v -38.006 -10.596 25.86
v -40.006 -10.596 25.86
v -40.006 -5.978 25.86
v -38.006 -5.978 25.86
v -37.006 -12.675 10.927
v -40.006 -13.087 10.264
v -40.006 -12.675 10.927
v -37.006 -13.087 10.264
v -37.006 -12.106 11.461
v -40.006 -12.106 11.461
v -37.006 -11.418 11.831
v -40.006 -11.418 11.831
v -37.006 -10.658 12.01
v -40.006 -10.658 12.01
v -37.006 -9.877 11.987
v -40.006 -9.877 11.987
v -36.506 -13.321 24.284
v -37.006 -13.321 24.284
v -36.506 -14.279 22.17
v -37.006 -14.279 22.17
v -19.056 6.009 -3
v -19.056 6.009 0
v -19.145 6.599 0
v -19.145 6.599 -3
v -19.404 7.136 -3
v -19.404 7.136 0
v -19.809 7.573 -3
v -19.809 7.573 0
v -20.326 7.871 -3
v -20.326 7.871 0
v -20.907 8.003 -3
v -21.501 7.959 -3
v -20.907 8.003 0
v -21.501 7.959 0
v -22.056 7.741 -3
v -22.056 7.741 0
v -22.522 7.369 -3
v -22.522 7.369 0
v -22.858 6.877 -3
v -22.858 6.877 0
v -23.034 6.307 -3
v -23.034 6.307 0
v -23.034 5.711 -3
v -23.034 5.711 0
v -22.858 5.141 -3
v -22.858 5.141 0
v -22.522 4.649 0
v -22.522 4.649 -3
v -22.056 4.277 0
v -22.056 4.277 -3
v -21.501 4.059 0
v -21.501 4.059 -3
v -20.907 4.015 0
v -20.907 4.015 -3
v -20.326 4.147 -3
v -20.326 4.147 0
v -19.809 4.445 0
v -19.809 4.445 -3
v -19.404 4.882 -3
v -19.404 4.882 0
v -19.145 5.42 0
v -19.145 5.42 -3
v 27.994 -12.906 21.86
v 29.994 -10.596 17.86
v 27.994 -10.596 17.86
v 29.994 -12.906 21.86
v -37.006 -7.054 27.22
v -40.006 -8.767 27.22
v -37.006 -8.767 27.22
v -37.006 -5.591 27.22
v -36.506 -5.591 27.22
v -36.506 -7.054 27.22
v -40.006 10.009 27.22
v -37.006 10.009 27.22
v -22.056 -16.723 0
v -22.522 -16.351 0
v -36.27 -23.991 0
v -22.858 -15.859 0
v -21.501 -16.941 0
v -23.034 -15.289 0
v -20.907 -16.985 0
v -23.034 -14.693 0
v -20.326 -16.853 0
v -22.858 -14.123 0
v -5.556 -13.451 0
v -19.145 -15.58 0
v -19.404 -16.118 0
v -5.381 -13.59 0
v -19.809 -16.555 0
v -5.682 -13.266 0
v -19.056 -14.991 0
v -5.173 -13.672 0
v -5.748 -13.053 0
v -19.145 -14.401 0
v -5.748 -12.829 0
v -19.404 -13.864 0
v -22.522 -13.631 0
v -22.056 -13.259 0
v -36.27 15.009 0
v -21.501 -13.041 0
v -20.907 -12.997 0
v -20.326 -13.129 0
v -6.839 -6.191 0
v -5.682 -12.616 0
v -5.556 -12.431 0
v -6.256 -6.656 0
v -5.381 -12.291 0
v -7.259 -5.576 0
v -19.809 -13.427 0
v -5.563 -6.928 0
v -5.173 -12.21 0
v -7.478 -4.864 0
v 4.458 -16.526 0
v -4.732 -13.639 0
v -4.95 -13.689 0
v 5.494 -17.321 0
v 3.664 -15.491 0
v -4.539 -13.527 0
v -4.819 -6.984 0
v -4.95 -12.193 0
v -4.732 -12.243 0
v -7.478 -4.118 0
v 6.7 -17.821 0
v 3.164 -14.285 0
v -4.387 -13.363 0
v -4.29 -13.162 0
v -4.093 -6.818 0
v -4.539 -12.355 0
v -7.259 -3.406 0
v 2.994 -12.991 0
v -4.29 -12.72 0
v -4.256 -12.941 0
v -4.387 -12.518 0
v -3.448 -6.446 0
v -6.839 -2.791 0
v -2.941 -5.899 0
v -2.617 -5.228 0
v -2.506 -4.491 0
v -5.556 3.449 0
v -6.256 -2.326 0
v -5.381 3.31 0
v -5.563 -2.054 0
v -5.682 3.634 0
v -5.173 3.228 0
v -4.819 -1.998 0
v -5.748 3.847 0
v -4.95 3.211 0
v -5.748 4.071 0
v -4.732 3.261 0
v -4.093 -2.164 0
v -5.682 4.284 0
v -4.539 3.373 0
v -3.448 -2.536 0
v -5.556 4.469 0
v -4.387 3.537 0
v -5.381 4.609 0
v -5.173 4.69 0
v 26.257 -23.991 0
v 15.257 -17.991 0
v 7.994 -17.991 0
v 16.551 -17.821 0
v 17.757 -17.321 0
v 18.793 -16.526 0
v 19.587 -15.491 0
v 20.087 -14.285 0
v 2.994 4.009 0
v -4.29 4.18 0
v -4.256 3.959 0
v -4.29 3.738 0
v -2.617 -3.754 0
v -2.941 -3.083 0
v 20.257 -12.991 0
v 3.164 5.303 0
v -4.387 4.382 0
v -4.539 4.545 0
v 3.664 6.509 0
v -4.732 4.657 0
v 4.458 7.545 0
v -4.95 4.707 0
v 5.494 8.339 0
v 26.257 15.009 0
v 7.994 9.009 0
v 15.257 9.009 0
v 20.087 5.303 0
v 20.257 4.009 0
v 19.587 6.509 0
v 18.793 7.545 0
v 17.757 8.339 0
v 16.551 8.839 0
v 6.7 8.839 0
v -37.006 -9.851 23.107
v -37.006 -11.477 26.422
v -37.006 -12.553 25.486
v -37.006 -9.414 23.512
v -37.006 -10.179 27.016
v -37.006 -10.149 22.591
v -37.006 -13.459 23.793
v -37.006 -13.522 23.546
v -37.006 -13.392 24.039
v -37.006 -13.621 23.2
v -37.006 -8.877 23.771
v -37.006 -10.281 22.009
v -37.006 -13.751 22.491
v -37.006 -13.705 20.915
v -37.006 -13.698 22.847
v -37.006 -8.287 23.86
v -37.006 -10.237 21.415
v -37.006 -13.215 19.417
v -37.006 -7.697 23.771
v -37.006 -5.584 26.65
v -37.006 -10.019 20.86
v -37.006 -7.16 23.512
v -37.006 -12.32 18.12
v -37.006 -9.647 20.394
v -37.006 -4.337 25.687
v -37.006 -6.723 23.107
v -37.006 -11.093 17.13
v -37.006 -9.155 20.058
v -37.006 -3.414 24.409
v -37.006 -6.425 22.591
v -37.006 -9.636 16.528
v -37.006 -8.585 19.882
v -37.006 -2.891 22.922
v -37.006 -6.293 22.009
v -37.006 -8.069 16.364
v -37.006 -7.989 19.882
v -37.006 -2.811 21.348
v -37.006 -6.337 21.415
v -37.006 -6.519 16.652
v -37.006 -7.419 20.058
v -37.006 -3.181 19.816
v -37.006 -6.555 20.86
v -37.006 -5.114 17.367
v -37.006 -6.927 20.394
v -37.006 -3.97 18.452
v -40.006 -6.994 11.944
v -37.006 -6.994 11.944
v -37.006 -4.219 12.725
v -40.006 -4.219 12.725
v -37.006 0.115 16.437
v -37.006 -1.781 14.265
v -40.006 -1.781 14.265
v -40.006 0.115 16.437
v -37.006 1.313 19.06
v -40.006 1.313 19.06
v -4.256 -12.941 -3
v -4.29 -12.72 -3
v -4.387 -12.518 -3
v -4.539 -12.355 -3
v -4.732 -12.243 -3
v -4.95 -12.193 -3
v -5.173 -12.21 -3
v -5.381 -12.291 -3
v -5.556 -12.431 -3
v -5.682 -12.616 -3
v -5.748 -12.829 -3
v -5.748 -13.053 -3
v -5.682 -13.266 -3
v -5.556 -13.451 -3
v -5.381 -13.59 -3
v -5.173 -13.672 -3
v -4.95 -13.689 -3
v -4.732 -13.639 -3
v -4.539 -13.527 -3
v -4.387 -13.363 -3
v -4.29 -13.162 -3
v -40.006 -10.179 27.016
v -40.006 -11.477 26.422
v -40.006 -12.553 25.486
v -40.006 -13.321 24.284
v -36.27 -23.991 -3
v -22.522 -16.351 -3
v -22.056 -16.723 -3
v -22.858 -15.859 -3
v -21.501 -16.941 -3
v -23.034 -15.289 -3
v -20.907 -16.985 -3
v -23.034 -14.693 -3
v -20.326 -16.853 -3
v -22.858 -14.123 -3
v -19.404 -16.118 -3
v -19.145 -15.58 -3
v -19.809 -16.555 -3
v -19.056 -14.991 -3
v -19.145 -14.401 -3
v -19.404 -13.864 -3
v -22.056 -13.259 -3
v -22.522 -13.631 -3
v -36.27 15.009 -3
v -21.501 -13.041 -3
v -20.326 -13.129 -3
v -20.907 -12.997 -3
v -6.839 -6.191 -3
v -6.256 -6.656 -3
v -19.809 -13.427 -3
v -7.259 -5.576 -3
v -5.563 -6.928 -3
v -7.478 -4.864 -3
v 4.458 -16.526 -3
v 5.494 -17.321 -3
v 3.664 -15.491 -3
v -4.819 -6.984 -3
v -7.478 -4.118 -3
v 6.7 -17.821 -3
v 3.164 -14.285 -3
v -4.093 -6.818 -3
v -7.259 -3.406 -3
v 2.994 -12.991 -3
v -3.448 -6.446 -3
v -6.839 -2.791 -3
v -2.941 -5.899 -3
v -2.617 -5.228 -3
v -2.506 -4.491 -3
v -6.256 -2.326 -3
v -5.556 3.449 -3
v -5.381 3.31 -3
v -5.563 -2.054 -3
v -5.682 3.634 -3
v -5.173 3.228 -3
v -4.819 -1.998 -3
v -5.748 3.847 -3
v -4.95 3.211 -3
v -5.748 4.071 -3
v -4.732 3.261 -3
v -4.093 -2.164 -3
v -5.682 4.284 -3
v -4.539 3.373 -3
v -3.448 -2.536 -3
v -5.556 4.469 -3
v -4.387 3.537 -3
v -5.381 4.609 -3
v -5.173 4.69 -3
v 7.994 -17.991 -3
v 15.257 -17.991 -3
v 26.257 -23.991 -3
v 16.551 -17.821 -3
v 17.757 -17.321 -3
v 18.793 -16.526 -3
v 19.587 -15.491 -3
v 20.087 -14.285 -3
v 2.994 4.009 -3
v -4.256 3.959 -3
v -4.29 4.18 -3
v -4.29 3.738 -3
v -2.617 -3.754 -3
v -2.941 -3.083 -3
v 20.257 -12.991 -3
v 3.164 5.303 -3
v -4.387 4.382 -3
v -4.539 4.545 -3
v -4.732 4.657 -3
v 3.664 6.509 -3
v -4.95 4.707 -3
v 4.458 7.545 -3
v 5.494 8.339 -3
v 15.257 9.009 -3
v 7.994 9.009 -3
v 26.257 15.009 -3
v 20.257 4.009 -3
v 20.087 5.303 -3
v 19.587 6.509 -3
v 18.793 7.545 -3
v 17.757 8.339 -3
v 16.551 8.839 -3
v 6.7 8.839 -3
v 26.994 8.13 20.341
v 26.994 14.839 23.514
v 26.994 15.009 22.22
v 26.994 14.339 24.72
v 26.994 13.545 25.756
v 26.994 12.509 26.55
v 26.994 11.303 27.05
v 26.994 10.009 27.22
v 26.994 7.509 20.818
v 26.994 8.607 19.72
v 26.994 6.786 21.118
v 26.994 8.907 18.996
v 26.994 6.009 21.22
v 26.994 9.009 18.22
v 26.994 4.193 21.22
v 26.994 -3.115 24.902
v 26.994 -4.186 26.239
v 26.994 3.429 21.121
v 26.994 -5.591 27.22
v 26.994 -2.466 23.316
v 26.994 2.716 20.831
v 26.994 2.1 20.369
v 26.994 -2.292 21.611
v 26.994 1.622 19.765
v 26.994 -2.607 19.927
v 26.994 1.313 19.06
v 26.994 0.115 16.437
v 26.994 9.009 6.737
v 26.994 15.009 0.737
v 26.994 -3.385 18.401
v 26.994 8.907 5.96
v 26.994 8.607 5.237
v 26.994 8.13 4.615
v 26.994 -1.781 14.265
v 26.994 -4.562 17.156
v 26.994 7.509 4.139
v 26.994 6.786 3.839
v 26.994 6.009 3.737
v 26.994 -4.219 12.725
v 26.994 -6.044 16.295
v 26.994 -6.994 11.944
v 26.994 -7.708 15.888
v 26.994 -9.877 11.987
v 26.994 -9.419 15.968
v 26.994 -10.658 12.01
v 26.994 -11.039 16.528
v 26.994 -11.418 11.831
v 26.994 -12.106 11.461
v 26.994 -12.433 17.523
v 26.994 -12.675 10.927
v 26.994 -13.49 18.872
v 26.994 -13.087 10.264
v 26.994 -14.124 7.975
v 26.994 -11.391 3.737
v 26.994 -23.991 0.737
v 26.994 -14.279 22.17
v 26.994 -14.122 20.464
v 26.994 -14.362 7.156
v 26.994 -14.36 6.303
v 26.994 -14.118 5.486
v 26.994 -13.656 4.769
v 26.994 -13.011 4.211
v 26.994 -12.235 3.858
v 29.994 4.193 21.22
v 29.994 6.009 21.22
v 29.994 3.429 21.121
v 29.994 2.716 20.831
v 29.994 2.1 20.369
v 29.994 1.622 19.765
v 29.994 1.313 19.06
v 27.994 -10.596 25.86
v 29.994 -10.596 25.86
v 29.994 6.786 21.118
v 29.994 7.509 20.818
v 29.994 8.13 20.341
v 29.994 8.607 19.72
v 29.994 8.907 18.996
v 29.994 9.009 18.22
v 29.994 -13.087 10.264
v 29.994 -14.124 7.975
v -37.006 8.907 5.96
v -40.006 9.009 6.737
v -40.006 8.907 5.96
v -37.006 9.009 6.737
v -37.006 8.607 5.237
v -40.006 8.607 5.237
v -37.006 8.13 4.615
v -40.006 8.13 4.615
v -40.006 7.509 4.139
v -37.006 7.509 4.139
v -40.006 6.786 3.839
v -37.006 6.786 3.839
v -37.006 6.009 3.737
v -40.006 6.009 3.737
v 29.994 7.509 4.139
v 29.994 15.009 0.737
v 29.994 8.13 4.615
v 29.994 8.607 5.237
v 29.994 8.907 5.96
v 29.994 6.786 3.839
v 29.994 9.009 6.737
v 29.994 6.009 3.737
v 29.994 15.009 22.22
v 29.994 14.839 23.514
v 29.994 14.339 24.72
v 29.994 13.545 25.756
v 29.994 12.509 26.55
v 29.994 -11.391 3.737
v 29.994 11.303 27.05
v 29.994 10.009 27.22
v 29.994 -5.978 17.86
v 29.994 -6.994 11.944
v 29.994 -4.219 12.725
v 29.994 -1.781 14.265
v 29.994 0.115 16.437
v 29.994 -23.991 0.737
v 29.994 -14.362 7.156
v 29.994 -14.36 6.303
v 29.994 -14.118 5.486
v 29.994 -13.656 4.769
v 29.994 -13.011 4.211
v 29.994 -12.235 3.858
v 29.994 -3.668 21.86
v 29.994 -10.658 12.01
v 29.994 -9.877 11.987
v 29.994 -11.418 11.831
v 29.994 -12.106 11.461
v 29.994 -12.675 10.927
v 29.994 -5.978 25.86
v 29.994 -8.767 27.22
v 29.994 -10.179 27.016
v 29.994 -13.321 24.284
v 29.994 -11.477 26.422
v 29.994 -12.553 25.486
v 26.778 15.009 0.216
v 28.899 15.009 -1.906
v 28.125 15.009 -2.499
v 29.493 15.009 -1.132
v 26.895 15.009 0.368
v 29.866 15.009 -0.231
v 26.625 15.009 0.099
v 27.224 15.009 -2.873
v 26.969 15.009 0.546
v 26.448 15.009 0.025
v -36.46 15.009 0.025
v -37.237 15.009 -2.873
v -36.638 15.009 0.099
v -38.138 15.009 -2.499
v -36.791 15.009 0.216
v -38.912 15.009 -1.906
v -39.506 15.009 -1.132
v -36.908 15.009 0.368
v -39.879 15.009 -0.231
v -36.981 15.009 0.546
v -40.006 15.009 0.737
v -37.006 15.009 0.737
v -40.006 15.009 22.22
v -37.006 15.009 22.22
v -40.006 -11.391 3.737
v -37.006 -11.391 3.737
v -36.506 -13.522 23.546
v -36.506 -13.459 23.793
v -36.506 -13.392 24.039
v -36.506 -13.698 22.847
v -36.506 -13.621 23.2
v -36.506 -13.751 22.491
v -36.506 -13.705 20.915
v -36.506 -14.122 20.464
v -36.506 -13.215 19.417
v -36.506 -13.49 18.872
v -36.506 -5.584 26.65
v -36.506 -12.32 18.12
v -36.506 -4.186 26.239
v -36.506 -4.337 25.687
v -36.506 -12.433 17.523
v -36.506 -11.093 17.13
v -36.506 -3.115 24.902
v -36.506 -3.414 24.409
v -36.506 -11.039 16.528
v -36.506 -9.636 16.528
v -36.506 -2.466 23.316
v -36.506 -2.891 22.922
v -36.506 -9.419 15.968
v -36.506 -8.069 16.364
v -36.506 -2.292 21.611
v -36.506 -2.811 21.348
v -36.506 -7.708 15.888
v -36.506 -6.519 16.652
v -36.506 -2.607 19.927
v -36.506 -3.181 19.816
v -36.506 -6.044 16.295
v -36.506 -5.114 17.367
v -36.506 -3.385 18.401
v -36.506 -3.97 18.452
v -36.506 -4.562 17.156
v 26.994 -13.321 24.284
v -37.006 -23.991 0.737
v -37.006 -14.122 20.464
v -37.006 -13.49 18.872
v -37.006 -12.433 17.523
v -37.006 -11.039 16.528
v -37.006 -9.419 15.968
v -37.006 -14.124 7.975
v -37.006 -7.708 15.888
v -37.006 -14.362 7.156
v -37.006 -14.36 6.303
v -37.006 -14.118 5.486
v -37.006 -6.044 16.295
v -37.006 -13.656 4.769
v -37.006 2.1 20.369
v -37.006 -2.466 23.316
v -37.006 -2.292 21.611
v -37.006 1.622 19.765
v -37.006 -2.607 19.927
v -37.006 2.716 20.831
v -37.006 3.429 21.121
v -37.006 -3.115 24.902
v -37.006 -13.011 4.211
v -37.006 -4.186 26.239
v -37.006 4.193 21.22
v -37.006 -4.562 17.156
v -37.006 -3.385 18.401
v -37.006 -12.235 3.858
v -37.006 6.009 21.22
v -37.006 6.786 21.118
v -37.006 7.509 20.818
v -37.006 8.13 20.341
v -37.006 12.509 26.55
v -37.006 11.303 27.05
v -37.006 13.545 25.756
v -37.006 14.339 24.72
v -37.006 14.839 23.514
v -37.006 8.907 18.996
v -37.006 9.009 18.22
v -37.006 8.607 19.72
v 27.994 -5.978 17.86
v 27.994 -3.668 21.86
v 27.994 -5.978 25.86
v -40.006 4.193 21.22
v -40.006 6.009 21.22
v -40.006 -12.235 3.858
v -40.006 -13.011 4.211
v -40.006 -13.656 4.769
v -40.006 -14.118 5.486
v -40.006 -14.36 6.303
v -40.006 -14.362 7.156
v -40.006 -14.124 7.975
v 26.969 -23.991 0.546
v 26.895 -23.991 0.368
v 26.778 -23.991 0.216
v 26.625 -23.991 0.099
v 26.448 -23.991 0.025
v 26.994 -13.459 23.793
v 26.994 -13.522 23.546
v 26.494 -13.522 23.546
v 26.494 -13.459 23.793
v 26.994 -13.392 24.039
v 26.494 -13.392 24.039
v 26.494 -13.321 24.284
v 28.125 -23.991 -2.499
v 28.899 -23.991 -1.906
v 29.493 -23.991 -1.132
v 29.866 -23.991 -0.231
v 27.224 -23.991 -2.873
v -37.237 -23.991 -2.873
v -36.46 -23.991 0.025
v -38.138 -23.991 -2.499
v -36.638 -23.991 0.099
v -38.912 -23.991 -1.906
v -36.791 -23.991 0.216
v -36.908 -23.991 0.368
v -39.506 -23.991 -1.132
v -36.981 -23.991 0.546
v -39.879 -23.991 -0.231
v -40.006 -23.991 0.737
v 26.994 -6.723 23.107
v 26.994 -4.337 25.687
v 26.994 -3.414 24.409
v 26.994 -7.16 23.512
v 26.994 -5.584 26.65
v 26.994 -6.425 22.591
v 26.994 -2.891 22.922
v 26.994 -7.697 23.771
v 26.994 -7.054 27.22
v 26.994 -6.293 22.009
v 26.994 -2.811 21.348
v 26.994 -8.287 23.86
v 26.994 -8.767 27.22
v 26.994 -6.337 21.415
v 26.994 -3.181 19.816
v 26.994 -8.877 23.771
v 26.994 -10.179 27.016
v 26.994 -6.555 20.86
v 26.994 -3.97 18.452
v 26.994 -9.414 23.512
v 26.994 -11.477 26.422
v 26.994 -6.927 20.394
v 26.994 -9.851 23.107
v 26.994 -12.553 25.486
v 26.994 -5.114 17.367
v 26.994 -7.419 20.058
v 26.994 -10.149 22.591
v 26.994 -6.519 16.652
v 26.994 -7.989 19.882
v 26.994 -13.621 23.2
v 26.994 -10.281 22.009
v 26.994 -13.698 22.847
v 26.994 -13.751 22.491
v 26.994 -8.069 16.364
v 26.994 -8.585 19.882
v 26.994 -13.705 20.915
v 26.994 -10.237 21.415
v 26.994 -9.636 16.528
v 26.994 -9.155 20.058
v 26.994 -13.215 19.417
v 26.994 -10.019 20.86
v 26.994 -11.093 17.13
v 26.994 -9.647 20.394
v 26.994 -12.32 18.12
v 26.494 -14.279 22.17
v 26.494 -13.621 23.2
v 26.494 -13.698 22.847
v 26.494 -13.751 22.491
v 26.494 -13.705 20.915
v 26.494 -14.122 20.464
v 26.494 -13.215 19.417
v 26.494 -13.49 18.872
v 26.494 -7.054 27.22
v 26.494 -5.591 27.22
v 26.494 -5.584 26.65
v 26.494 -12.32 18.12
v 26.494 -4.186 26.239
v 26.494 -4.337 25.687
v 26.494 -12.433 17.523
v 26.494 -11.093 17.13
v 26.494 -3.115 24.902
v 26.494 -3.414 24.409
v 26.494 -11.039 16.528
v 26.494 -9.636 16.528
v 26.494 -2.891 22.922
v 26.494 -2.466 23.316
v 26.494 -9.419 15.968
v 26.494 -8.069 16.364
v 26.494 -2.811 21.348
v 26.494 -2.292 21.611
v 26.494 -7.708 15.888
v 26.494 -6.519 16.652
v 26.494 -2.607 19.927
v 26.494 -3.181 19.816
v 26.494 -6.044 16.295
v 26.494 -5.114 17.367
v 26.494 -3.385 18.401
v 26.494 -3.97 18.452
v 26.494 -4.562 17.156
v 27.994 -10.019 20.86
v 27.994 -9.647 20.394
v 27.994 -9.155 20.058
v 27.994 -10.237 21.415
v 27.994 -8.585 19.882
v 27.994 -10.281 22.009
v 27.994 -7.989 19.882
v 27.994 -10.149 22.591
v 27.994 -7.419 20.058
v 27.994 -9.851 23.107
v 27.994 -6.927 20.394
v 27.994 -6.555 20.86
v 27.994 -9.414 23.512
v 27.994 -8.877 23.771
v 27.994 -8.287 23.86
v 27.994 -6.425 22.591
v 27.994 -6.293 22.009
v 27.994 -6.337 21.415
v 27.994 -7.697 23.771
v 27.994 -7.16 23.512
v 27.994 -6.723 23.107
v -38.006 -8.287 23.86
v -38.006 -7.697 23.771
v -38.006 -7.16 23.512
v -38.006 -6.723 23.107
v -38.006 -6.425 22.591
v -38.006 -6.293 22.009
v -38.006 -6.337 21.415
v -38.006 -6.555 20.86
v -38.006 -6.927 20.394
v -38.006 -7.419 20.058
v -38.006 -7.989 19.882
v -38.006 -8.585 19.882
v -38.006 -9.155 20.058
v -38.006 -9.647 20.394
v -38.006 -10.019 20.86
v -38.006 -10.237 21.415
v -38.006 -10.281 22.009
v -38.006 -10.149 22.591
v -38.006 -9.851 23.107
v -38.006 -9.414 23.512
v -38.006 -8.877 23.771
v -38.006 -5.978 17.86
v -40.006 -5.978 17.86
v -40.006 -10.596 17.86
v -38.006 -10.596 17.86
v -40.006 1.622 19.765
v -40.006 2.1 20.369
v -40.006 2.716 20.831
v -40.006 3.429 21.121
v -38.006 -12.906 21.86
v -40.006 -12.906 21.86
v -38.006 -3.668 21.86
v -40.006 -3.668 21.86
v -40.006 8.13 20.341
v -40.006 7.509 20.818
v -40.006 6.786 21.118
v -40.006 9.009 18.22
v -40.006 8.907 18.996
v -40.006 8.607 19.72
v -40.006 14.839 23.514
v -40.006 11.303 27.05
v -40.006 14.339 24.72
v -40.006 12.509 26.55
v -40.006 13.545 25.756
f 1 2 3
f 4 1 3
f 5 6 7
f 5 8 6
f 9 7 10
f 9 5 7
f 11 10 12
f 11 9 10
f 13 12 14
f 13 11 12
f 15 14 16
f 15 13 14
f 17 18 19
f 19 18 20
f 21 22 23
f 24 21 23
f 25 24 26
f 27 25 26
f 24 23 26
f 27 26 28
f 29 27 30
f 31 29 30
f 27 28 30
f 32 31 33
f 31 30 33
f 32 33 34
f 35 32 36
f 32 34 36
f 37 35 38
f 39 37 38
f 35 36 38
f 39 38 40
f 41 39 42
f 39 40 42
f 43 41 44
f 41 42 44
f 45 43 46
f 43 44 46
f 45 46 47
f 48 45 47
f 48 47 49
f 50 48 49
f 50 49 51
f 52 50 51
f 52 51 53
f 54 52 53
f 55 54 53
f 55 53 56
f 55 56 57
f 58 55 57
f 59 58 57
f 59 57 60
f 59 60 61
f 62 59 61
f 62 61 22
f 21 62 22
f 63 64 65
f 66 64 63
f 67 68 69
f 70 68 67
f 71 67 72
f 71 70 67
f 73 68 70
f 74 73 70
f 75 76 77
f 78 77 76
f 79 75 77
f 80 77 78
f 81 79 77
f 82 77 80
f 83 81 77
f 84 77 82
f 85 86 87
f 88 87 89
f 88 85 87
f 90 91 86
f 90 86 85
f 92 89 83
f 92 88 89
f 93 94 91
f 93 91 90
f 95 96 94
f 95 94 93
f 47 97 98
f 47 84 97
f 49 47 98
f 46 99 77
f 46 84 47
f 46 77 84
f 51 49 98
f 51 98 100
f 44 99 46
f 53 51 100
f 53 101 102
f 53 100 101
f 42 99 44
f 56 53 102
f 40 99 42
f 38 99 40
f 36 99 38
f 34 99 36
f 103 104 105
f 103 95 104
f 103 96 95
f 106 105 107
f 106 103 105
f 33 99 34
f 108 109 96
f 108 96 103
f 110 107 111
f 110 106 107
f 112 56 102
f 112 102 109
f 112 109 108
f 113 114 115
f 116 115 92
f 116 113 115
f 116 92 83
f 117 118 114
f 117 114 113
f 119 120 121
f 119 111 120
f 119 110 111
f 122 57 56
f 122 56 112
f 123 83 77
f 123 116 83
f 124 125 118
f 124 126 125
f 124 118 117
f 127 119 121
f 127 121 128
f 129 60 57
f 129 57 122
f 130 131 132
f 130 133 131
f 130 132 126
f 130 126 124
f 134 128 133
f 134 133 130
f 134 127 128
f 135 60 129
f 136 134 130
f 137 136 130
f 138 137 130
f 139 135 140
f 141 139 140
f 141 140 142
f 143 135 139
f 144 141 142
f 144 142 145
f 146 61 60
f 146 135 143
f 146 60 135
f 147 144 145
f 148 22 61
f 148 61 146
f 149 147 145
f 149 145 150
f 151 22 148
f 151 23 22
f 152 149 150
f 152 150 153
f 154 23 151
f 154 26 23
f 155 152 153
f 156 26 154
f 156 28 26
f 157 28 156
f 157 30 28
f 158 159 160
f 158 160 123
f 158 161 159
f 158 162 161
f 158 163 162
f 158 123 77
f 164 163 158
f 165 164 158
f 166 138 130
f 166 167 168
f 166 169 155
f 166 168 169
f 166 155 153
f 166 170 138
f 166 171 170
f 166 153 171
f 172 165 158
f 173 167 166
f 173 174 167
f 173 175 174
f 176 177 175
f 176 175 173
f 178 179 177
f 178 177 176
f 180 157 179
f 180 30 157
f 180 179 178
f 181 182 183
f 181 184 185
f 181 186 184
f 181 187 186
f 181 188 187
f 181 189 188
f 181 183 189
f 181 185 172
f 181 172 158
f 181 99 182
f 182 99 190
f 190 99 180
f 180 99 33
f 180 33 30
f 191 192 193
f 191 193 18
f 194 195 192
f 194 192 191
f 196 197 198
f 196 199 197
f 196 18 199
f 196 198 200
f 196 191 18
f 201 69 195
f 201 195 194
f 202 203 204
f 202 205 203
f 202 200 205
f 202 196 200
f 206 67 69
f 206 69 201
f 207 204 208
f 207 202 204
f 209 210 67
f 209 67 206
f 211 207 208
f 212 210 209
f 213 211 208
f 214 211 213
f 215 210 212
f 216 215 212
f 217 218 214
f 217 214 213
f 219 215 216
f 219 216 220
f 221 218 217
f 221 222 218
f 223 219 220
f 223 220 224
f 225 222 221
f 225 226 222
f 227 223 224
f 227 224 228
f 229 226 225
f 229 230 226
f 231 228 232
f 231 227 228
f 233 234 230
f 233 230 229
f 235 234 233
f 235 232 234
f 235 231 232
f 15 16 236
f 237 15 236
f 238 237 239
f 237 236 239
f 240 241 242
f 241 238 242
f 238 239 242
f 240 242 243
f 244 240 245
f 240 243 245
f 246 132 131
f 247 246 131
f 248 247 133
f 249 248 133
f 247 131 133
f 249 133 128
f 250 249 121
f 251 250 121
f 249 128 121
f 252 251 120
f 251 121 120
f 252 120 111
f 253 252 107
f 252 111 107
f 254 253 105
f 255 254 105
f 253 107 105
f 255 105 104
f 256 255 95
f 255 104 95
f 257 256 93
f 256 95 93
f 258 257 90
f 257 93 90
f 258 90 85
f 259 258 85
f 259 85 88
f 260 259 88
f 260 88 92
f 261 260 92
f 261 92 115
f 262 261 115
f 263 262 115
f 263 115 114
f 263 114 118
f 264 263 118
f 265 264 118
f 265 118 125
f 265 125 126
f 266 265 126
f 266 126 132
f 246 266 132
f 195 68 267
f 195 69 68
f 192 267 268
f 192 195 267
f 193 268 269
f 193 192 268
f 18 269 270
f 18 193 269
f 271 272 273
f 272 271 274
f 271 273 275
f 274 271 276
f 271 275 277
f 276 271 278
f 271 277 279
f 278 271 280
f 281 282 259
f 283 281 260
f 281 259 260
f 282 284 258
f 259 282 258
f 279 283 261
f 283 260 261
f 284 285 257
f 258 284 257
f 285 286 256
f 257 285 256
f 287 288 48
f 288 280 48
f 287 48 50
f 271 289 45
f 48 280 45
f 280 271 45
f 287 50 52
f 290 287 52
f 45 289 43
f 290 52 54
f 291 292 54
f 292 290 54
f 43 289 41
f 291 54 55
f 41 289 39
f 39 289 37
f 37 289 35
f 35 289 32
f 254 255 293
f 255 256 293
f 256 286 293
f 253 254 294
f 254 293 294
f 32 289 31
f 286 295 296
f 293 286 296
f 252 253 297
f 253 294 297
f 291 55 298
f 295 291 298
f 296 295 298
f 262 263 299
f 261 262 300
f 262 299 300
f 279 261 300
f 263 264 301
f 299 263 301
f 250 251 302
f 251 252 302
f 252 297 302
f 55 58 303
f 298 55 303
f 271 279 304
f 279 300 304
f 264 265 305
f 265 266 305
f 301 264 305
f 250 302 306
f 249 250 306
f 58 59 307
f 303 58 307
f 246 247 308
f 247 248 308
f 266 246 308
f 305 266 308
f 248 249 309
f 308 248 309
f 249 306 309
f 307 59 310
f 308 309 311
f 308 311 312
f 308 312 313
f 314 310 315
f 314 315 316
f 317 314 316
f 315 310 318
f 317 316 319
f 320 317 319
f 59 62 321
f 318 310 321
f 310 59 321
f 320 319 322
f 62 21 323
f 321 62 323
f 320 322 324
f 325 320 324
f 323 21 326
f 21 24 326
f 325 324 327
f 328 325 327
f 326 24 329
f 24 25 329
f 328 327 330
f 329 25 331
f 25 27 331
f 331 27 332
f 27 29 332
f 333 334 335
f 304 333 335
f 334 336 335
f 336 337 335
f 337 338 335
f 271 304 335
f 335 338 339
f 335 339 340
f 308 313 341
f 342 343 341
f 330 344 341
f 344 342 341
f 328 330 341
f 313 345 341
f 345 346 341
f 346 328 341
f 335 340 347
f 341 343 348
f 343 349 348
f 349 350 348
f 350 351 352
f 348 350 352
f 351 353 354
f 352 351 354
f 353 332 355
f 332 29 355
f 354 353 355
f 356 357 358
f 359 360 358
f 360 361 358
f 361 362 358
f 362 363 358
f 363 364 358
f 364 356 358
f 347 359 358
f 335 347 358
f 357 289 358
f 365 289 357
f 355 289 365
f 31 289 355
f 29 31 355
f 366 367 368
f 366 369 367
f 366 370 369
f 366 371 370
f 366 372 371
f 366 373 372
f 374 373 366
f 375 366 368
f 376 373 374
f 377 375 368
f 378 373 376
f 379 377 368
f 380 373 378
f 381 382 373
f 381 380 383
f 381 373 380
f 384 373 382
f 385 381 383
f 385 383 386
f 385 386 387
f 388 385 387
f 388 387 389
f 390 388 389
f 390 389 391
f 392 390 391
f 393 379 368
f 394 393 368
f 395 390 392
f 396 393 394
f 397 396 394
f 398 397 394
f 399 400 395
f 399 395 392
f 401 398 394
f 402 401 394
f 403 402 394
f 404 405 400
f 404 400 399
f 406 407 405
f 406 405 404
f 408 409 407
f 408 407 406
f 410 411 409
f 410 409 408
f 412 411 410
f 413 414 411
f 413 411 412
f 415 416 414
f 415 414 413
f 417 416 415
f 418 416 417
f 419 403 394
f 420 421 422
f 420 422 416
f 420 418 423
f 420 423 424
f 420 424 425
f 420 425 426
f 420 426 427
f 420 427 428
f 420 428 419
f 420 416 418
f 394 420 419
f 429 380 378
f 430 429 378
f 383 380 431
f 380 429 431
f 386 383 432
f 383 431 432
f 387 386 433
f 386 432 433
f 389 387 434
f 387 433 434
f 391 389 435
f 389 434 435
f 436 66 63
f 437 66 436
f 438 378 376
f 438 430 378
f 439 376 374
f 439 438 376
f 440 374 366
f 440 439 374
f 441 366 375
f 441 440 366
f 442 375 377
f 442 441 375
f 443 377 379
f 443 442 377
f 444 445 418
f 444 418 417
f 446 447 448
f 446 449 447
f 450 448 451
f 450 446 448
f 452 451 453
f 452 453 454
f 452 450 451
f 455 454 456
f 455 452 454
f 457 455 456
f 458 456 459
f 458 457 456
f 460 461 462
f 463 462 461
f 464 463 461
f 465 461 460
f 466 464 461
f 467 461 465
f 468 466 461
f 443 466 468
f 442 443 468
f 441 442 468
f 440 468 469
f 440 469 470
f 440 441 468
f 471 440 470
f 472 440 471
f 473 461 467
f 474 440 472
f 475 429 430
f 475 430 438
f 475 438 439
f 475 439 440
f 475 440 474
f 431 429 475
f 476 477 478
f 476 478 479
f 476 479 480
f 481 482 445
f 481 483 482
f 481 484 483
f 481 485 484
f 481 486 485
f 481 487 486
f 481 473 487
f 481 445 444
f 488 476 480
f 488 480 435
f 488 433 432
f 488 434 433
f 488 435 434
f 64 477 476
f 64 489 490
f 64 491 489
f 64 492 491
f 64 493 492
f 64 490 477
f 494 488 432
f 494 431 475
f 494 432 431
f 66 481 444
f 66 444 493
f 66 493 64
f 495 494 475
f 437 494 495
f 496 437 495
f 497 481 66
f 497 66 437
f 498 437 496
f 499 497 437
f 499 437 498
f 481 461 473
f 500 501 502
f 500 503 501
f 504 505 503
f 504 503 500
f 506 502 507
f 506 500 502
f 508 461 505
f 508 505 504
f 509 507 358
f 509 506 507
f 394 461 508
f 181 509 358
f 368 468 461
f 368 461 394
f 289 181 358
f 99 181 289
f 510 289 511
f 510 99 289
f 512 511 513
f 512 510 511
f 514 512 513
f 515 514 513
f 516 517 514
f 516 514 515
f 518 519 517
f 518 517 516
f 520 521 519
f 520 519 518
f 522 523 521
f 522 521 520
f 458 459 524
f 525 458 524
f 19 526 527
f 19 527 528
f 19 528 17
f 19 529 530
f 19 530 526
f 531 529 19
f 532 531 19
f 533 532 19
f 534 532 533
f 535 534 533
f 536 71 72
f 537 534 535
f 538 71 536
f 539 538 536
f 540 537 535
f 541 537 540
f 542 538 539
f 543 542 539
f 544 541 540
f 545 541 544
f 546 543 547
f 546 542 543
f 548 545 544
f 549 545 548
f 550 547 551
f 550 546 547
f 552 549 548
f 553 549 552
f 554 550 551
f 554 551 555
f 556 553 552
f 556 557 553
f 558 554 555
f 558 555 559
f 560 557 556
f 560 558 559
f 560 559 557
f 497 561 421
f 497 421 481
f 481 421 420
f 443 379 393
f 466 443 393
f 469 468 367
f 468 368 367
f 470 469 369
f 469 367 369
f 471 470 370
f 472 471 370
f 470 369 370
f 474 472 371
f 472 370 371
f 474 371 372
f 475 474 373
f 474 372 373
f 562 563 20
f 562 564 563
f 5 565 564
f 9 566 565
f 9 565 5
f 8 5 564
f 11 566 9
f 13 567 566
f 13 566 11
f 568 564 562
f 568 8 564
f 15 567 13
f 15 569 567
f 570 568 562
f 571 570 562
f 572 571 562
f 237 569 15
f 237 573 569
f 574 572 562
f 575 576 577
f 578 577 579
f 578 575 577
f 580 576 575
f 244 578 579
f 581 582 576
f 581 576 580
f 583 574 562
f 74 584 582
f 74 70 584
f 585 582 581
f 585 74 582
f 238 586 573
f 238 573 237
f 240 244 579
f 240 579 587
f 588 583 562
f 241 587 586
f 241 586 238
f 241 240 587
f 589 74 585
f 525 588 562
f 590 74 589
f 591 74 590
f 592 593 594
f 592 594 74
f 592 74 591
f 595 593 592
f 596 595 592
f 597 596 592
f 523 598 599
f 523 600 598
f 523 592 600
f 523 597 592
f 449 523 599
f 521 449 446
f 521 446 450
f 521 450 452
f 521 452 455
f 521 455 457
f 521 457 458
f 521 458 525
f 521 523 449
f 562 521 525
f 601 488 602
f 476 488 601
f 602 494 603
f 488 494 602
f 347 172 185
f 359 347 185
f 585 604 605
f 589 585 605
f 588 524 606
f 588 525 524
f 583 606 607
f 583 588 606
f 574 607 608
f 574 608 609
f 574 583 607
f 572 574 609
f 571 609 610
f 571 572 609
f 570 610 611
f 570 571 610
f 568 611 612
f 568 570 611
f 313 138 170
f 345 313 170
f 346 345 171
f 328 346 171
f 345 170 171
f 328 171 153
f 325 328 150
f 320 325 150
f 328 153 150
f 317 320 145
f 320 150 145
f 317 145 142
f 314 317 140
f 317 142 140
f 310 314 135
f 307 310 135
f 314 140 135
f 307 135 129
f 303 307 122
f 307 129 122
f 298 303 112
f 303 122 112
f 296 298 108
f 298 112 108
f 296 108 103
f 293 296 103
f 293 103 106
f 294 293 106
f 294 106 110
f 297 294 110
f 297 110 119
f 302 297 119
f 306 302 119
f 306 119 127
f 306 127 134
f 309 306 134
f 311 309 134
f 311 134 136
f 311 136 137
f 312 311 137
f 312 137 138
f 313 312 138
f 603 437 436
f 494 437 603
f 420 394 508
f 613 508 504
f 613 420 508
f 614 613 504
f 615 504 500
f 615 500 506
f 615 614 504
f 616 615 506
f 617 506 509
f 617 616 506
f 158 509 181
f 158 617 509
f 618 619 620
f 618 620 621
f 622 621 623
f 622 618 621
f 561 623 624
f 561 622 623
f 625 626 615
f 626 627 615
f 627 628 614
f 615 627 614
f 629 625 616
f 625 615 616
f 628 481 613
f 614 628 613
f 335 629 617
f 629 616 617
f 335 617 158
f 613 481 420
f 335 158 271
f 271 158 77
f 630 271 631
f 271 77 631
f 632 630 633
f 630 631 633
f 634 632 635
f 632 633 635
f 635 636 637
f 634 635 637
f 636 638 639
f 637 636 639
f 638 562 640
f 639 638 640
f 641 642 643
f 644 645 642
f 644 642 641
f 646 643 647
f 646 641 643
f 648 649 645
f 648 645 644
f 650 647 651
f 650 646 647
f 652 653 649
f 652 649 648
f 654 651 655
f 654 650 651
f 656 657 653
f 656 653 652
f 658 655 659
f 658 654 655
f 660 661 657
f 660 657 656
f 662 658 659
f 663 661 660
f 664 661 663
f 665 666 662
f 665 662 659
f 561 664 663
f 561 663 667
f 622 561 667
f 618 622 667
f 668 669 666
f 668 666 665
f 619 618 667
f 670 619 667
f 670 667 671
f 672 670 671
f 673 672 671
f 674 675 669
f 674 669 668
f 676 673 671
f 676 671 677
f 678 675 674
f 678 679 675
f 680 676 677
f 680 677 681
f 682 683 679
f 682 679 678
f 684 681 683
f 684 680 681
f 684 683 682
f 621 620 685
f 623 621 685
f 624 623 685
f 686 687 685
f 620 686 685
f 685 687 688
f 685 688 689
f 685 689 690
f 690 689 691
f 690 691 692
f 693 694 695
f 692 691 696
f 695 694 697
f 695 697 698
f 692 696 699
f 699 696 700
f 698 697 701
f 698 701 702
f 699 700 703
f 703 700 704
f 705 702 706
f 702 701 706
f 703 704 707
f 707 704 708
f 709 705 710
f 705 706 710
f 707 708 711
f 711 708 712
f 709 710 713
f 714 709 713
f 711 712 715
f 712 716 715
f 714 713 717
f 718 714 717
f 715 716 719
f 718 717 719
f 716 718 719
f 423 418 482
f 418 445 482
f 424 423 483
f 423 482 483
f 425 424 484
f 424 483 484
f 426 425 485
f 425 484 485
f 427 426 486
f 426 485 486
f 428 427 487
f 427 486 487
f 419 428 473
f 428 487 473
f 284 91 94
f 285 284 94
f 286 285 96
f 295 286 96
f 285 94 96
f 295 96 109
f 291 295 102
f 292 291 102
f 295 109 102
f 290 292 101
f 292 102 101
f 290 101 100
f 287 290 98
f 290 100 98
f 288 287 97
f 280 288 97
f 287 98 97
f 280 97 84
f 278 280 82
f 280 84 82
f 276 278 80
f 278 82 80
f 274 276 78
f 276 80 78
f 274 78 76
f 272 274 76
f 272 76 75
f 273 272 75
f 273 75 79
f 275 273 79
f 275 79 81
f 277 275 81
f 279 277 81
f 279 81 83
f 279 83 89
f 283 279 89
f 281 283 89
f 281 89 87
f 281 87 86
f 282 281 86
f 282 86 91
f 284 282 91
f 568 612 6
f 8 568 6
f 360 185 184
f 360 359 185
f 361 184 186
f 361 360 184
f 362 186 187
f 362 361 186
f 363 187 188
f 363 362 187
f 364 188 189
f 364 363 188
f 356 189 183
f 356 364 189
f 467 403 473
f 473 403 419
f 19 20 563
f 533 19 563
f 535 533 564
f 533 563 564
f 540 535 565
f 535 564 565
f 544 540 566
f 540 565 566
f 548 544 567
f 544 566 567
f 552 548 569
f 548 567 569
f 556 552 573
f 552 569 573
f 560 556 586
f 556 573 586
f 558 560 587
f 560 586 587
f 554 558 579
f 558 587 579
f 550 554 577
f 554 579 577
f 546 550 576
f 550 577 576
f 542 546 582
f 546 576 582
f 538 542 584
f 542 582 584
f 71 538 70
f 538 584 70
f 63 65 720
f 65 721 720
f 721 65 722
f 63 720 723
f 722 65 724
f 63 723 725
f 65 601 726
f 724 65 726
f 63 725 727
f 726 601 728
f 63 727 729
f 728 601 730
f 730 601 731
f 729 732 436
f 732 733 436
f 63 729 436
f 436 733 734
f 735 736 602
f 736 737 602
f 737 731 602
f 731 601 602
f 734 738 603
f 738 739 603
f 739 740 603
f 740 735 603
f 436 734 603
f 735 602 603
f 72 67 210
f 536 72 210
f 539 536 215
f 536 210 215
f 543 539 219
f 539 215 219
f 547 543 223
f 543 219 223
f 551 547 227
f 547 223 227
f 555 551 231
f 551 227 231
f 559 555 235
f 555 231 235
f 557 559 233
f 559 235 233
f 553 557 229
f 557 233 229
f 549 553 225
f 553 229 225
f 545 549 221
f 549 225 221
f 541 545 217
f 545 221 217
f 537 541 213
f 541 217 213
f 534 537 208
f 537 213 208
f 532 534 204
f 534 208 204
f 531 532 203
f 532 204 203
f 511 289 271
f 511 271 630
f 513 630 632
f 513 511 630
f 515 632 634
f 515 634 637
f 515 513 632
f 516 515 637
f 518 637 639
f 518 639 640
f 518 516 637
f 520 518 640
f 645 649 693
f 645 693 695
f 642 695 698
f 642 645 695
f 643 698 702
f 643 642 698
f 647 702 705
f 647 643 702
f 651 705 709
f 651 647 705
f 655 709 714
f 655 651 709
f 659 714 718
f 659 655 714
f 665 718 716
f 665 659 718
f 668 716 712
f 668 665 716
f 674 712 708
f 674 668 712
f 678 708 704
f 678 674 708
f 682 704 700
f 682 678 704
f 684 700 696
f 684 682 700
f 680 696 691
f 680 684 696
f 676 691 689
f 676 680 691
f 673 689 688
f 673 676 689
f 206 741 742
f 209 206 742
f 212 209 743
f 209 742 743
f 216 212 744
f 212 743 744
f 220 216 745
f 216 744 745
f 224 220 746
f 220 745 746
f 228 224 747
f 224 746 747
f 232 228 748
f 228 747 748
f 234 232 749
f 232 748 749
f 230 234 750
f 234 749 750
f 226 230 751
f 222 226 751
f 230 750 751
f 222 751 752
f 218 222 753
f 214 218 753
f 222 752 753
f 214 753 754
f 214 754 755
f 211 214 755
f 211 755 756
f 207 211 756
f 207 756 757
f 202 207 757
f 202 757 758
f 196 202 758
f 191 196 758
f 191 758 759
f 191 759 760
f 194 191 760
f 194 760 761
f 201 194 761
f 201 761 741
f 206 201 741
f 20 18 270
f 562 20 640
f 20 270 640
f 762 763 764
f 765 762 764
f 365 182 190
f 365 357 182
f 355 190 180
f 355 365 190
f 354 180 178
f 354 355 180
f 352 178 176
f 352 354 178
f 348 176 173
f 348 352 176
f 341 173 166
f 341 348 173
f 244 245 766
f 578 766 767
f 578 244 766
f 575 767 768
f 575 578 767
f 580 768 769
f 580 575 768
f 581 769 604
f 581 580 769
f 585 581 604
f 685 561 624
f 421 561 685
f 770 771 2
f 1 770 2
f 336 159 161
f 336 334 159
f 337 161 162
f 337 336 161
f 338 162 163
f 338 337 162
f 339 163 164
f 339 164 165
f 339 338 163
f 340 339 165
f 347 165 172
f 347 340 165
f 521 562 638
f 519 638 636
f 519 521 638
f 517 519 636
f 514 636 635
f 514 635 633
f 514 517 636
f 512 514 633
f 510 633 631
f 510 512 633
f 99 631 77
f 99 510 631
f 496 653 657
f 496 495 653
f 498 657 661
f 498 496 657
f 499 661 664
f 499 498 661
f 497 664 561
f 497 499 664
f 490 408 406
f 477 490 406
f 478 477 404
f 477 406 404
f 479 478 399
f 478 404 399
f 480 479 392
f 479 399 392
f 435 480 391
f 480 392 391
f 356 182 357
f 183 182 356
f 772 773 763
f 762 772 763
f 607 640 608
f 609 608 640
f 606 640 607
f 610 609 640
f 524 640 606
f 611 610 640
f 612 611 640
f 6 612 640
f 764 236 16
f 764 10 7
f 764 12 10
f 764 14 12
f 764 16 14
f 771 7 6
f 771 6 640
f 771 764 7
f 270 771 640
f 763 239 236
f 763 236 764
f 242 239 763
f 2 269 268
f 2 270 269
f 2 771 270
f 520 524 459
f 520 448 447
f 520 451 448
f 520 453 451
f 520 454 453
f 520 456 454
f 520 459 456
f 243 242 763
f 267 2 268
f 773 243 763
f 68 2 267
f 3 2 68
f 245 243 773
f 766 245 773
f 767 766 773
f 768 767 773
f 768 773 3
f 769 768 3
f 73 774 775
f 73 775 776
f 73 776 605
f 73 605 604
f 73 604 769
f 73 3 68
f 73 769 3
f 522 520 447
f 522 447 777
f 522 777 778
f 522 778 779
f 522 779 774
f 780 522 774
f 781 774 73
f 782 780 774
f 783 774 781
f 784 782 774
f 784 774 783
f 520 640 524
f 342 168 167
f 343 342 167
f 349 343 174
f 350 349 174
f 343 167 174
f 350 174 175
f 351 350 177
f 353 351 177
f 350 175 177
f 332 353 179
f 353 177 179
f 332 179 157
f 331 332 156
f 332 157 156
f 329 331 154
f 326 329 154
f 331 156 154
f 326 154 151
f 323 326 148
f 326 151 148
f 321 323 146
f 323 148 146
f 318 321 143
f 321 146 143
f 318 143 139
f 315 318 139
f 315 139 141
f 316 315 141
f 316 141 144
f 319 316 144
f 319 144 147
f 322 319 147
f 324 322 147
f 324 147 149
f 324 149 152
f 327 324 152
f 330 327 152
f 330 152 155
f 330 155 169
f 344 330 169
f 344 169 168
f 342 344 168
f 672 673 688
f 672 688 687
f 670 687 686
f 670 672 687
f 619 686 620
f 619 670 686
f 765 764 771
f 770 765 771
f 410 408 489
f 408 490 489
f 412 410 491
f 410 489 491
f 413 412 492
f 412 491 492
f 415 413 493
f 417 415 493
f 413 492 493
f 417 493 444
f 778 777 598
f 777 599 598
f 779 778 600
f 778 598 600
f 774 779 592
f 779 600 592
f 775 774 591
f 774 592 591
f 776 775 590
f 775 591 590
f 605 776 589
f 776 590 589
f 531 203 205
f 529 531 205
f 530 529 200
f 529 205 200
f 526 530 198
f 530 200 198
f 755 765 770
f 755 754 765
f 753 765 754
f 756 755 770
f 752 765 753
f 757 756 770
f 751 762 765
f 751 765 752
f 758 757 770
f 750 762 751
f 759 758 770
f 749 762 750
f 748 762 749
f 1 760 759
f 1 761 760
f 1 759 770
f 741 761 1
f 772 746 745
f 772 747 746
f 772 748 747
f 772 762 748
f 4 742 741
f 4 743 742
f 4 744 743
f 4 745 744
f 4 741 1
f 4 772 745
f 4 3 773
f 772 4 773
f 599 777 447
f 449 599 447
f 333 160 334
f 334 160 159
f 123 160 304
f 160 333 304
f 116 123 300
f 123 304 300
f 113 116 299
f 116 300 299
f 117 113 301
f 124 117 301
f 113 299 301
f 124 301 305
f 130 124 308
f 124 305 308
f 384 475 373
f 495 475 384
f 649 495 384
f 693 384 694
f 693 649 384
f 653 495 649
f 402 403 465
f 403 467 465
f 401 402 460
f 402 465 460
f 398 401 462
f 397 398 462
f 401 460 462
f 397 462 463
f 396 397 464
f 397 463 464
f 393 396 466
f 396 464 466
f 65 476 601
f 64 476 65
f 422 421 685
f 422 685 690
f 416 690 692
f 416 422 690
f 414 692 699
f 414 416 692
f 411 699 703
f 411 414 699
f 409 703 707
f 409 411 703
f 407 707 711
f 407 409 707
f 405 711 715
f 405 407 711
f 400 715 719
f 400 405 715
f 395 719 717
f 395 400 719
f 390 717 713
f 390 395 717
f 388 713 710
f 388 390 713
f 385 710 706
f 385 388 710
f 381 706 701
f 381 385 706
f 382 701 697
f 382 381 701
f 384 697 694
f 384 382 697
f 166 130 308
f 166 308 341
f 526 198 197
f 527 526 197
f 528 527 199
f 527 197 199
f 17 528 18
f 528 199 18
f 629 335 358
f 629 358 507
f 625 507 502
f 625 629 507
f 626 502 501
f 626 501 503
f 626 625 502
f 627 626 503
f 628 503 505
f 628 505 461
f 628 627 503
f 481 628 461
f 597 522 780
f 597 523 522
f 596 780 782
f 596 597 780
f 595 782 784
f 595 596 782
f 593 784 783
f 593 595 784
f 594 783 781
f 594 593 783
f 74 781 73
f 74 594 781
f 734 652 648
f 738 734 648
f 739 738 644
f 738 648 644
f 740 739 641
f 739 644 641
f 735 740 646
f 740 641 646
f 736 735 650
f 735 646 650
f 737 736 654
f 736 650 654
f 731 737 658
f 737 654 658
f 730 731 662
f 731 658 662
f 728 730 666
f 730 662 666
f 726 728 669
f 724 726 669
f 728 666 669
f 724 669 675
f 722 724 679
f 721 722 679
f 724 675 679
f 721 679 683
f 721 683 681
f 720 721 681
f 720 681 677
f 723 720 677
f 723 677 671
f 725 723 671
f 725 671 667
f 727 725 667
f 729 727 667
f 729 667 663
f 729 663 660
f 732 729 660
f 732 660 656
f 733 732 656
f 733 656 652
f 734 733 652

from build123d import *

# Parameters (mm, degrees)
ESBO_O1_W                        = 64
ESBO_O1_H                        = 39
FLANGE_BASE1_DEPTH               = 3
ESBO_O6_R                        = 2
ESBO_O6_R_2                      = 2.5
ESBO_O6_R_3                      = 0.75
CORTE_EXTRUS_O1_DEPTH            = 10
ARESTA_FLANGE1_STRIP_W           = 13.4732
ARESTA_FLANGE1_STRIP_H           = 3
ARESTA_FLANGE1_STRIP_CUT_DEPTH   = 39
ARESTA_FLANGE1_STRIP_2_W         = 13.4732
ARESTA_FLANGE1_STRIP_2_H         = 3
ARESTA_FLANGE1_STRIP_CUT_2_DEPTH = 39
ARESTA_FLANGE1_DEPTH             = 39
ARESTA_FLANGE1_BEND_DEPTH        = 39
CORTE_EXTRUS_O2_REACH            = 80.845
ESBO_O13_R                       = 2
FILETE1_R                        = 5
ESBO_O13_3_R                     = 2
CUT_EXTRUDE1_DEPTH               = 2
BOSS_EXTRUDE1_DEPTH              = 0.5
SKETCH15_W                       = 17.2634
SKETCH15_H                       = 27
CUT_EXTRUDE2_DEPTH               = 3
FILLET1_R                        = 5
CUT_EXTRUDE3_START               = -70
CUT_EXTRUDE3_DEPTH               = 70
FILLET2_R                        = 3


# Sheet-metal steps are written as plain solids
with BuildPart() as part:
    # Esboço1 → Flange-base1 (new body)
    with BuildSketch(Plane.XY):
        with Locations((-5.006264217, -4.490936556)):
            Rectangle(ESBO_O1_W, ESBO_O1_H)
    extrude(amount=-FLANGE_BASE1_DEPTH)

    # Esboço6 → Corte-extrusão1 (cut)
    with BuildSketch(Plane.XY):
        with Locations((-21.056264217, 6.009063444)):
            Circle(ESBO_O6_R)
        with Locations((-21.056264217, -14.990936556)):
            Circle(ESBO_O6_R)
        with Locations((-5.006264217, -4.490936556)):
            Circle(ESBO_O6_R_2)
        with Locations((-5.006264217, -12.940936556)):
            Circle(ESBO_O6_R_3)
        with Locations((-5.006264217, 3.959063444)):
            Circle(ESBO_O6_R_3)
    extrude(amount=-CORTE_EXTRUS_O1_DEPTH, mode=Mode.SUBTRACT)

    # Aresta-Flange1 strip (across the edge) → Aresta-Flange1 strip cut (cut)
    with BuildSketch(Plane(origin=(26.993735783, -23.990936556, 0), x_dir=(-1, 0, 0), z_dir=(0, 1, 0))):
        with Locations((-6, -1.5)):
            Rectangle(ARESTA_FLANGE1_STRIP_W, ARESTA_FLANGE1_STRIP_H)
    extrude(amount=ARESTA_FLANGE1_STRIP_CUT_DEPTH, mode=Mode.SUBTRACT)

    # Aresta-Flange1 strip 2 (across the edge) → Aresta-Flange1 strip cut 2 (cut)
    with BuildSketch(Plane(origin=(-37.006264217, 15.009063444, 0), x_dir=(1, 0, 0), z_dir=(0, -1, 0))):
        with Locations((-6, -1.5)):
            Rectangle(ARESTA_FLANGE1_STRIP_2_W, ARESTA_FLANGE1_STRIP_2_H)
    extrude(amount=ARESTA_FLANGE1_STRIP_CUT_2_DEPTH, mode=Mode.SUBTRACT)

    # Aresta-Flange1 section (across the edge) → Aresta-Flange1 (add)
    with BuildSketch(Plane(origin=(26.993735783, -23.990936556, 0), x_dir=(-1, 0, 0), z_dir=(0, 1, 0))):
        with BuildLine():
            Line((-3, 0.7366), (-3, 27.22))
            Line((-3, 27.22), (0, 27.22))
            Line((0, 27.22), (0, 0.7366))
            ThreePointArc((0, 0.7366), (0.215745145, 0.215745145), (0.7366, 0))
            Line((0.7366, 0), (0.7366, -3))
            ThreePointArc((0.7366, -3), (-1.905575199, -1.905575199), (-3, 0.7366))
        make_face()
    extrude(amount=ARESTA_FLANGE1_DEPTH)

    # Aresta-Flange1 section 2 (across the edge) → Aresta-Flange1 bend (add)
    with BuildSketch(Plane(origin=(-37.006264217, 15.009063444, 0), x_dir=(1, 0, 0), z_dir=(0, -1, 0))):
        with BuildLine():
            Line((-3, 0.7366), (-3, 27.22))
            Line((-3, 27.22), (0, 27.22))
            Line((0, 27.22), (0, 0.7366))
            ThreePointArc((0, 0.7366), (0.215745145, 0.215745145), (0.7366, 0))
            Line((0.7366, 0), (0.7366, -3))
            ThreePointArc((0.7366, -3), (-1.905575199, -1.905575199), (-3, 0.7366))
        make_face()
    extrude(amount=ARESTA_FLANGE1_BEND_DEPTH)

    # Corte-extrusão2: up to this face of the body (flat: up to its plane)
    corte_extrus_o2_end = Plane(part.part.faces().sort_by_distance((29.993735783, -4.490936556, 13.9783))[0])
    # Esboço13 → Corte-extrusão2 (cut, up to the picked face)
    with BuildSketch(Plane.ZY.offset(40.006264217), mode=Mode.PRIVATE) as corte_extrus_o2_sk1:
        with Locations((21.86, -8.287001978)):
            Circle(ESBO_O13_R)
    corte_extrus_o2_tool1 = split(extrude(corte_extrus_o2_sk1.sketch, amount=-CORTE_EXTRUS_O2_REACH, mode=Mode.PRIVATE), bisect_by=corte_extrus_o2_end, keep=Keep.BOTH, mode=Mode.PRIVATE)
    # Esboço13 → Corte-extrusão2 (cut, up to the picked face)
    with BuildSketch(Plane.ZY.offset(40.006264217), mode=Mode.PRIVATE) as corte_extrus_o2_sk2:
        Polygon((27.22, -11.990936556), (0.7366, -23.990936556), (27.22, -23.990936556), align=None)
    corte_extrus_o2_tool2 = split(extrude(corte_extrus_o2_sk2.sketch, amount=-CORTE_EXTRUS_O2_REACH, mode=Mode.PRIVATE), bisect_by=corte_extrus_o2_end, keep=Keep.BOTH, mode=Mode.PRIVATE)
    add(corte_extrus_o2_tool1.solids().sort_by(Axis((-40.006264, -8.287002, 21.86), (1, 0, 0)))[0], mode=Mode.SUBTRACT)
    add(corte_extrus_o2_tool2.solids().sort_by(Axis((-40.006264, -19.990937, 18.3922), (1, 0, 0)))[0], mode=Mode.SUBTRACT)

    # Filete1
    filete1_edges = [part.edges().sort_by_distance(p)[0] for p in [
        (-38.506264217, -11.990936556, 27.22),
        (28.493735783, -11.990936556, 27.22),
        (28.493735783, 15.009063444, 27.22),
        (-38.506264217, 15.009063444, 27.22),
    ]]
    fillet(filete1_edges, radius=FILETE1_R)

    # Esboço13<3> → Cut-Extrude1 (cut)
    with BuildSketch(Plane.ZY.offset(40.006264217)):
        Polygon((21.86, -3.668199824), (17.86, -5.977600901), (17.86, -10.596403054), (21.86, -12.905804131), (25.86, -10.596403054), (25.86, -5.977600901), align=None)
        with Locations((21.86, -8.287001978)):
            Circle(ESBO_O13_3_R, mode=Mode.SUBTRACT)
    cut_extrude1 = extrude(amount=-CUT_EXTRUDE1_DEPTH, mode=Mode.SUBTRACT)

    # Sketch7 → Boss-Extrude1 (add)
    with BuildSketch(Plane(origin=(-37.006264217, 0, 0), x_dir=(0, 0, -1), z_dir=(1, 0, 0))):
        with BuildLine():
            ThreePointArc((-23.546022833, -13.522202738), (-23.915908256, -13.425840182), (-24.283610421, -13.32145586))
            Line((-24.283610421, -13.32145586), (-22.170433783, -14.278965835))
            ThreePointArc((-22.170433783, -14.278965835), (-16.672492687, -5.272077786), (-27.22, -5.59063405))
            Line((-27.22, -5.59063405), (-27.22, -7.053956966))
            ThreePointArc((-27.22, -7.053956966), (-17.36732716, -5.11432318), (-22.490825712, -13.750705751))
            ThreePointArc((-22.490825712, -13.750705751), (-23.024044759, -13.66240892), (-23.546022833, -13.522202738))
        make_face()
    boss_extrude1 = extrude(amount=BOSS_EXTRUDE1_DEPTH)

    # Mirror1: Cut-Extrude1, Boss-Extrude1 across plane
    add(cut_extrude1.mirror(Plane.ZY.offset(5.006264217)), mode=Mode.SUBTRACT)
    add(boss_extrude1.mirror(Plane.ZY.offset(5.006264217)))

    # Sketch15 → Cut-Extrude2 (cut)
    with BuildSketch(Plane.XY):
        with Locations((11.625435783, -4.490936556)):
            Rectangle(SKETCH15_W, SKETCH15_H)
    extrude(amount=-CUT_EXTRUDE2_DEPTH, mode=Mode.SUBTRACT)

    # Fillet1
    fillet1_edges = [part.edges().sort_by_distance(p)[0] for p in [
        (2.993735783, -17.990936556, -1.5),
        (2.993735783, 9.009063444, -1.5),
        (20.257135783, 9.009063444, -1.5),
        (20.257135783, -17.990936556, -1.5),
    ]]
    fillet(fillet1_edges, radius=FILLET1_R)

    # Sketch16 → Cut-Extrude3 (cut)
    with BuildSketch(Plane(origin=(29.993735783, 0, 0), x_dir=(0, 0, -1), z_dir=(1, 0, 0)).offset(CUT_EXTRUDE3_START)):
        with BuildLine():
            Line((-21.22, 9.009063444), (-3.7366, 9.009063444))
            Line((-3.7366, 9.009063444), (-3.7366, -16.044391464))
            Line((-3.7366, -16.044391464), (-12.588351652, -12.033538634))
            ThreePointArc((-12.588351652, -12.033538634), (-13.394705743, -2.963582668), (-21.22, 1.692497008))
            Line((-21.22, 1.692497008), (-21.22, 9.009063444))
        make_face()
    extrude(amount=CUT_EXTRUDE3_DEPTH, mode=Mode.SUBTRACT)

    # Fillet2
    fillet2_edges = [part.edges().sort_by_distance(p)[0] for p in [
        (28.493735783, 1.692497008, 21.22),
        (28.493735783, 9.009063444, 21.22),
        (28.493735783, 9.009063444, 3.7366),
        (28.493735783, -16.044391464, 3.7366),
        (28.493735783, -12.033538634, 12.588351652),
        (-38.506264217, 1.692497008, 21.22),
        (-38.506264217, 9.009063444, 21.22),
        (-38.506264217, 9.009063444, 3.7366),
        (-38.506264217, -16.044391464, 3.7366),
        (-38.506264217, -12.033538634, 12.588351652),
    ]]
    fillet(fillet2_edges, radius=FILLET2_R)


solid = part.part
